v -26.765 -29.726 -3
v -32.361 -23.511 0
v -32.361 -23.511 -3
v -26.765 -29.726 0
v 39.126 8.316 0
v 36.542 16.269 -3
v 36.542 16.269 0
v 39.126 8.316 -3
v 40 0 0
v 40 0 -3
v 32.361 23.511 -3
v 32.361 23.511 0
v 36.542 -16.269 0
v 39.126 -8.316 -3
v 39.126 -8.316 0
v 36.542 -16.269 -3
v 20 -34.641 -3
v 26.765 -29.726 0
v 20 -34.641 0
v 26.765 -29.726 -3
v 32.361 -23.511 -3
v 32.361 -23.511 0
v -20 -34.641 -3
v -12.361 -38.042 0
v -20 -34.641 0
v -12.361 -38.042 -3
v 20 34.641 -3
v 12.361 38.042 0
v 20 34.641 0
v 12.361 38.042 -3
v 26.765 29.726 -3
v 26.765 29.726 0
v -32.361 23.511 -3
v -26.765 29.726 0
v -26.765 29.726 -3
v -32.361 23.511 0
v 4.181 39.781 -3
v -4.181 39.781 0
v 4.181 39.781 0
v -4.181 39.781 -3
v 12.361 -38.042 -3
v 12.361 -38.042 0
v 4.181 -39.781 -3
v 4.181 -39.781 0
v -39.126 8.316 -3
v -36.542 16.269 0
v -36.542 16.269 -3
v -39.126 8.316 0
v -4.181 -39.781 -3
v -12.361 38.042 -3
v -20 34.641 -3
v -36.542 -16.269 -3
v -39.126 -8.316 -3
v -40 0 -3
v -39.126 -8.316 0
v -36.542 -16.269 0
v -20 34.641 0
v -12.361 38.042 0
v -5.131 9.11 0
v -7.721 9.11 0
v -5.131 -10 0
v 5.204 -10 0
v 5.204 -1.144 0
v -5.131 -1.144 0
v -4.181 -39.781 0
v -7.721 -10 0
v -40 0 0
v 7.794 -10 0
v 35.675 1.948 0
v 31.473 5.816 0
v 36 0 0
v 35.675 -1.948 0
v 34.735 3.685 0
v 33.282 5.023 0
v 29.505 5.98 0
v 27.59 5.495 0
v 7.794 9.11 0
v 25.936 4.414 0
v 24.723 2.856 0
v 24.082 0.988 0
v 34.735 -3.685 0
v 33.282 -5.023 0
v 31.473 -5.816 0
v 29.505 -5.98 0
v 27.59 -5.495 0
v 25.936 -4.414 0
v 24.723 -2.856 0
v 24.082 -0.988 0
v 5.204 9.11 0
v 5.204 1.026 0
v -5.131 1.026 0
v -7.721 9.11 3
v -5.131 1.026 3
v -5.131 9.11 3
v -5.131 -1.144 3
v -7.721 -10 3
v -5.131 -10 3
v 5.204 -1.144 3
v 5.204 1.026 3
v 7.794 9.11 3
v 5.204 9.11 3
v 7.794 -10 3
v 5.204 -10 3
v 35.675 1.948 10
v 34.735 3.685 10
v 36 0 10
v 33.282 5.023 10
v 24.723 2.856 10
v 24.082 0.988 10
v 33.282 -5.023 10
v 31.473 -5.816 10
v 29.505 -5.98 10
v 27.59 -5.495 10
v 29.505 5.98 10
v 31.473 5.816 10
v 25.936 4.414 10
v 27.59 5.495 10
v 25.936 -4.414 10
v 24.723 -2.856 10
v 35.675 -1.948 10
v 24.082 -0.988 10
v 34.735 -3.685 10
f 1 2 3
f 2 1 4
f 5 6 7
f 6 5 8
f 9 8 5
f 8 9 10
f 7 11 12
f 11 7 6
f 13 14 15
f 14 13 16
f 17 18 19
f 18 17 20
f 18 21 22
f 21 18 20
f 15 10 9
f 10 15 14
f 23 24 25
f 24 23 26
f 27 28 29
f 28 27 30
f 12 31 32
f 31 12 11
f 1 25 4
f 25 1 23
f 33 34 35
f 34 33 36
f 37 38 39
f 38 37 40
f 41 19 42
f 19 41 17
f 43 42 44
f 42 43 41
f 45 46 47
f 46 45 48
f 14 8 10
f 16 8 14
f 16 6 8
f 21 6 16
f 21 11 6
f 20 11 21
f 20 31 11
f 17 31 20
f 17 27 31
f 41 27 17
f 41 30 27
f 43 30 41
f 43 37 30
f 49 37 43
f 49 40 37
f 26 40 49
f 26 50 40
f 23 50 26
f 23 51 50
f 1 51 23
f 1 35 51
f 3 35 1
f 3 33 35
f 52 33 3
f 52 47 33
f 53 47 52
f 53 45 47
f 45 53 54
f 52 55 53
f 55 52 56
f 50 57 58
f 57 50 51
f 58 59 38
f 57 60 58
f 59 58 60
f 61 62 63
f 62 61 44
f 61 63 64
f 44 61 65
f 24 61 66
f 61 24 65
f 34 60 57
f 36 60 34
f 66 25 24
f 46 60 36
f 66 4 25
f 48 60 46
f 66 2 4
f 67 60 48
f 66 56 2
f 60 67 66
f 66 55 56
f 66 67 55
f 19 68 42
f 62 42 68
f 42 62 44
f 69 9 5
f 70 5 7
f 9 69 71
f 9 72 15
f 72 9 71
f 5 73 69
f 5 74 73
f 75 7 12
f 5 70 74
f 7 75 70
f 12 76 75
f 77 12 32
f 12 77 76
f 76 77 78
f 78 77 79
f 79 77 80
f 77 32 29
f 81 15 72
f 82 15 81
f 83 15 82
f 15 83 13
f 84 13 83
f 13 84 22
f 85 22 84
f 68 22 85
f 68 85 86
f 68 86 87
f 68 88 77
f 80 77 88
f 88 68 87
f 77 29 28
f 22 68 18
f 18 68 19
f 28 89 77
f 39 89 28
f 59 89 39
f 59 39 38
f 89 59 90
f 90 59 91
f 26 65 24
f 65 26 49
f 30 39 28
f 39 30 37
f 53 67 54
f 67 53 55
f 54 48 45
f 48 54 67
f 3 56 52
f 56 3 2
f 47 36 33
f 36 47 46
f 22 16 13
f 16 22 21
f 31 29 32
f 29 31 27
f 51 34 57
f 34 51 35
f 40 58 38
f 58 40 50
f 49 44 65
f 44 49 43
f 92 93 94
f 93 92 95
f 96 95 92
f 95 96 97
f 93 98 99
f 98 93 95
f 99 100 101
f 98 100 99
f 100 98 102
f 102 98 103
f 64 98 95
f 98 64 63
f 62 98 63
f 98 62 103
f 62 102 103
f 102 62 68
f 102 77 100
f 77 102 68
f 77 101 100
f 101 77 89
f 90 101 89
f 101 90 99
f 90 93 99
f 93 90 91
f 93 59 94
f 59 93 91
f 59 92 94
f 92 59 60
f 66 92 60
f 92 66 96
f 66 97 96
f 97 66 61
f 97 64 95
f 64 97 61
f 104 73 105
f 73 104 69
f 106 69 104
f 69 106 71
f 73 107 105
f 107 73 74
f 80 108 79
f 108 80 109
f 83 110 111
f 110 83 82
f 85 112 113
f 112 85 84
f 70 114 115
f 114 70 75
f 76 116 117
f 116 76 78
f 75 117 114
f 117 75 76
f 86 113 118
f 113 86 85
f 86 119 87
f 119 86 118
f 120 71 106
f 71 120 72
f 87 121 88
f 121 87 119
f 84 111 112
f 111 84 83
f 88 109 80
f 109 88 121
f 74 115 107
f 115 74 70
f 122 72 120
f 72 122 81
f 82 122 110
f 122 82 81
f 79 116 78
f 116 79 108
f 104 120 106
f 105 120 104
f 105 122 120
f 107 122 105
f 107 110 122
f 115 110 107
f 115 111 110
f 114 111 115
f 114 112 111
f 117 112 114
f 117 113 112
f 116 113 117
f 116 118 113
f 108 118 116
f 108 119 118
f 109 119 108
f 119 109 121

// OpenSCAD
// This is the name of the element. Use the element symbol here.
element = "H";

//This is the number of covalent bonds the atom makes.
bonds = 1; // min/max:[1:4]

module main(){
union(){
    translate([0,0,-3]) cylinder(3,40,40);
    translate([-10,-10,0]) scale([2,2,5]) linear_extrude(0.6) text(element);

    if(bonds>=1){
        translate ([30,0,0]) cylinder(10,6,6);
    }
    if(bonds>=2){
        translate ([-30,0,0]) cylinder(10,6,6);
    }
    if(bonds>=3){
        translate ([0,30,0]) cylinder(10,6,6);
    }
    if(bonds>=4){
        translate ([0,-30,0]) cylinder(10,6,6);
    }
}
}

main();
